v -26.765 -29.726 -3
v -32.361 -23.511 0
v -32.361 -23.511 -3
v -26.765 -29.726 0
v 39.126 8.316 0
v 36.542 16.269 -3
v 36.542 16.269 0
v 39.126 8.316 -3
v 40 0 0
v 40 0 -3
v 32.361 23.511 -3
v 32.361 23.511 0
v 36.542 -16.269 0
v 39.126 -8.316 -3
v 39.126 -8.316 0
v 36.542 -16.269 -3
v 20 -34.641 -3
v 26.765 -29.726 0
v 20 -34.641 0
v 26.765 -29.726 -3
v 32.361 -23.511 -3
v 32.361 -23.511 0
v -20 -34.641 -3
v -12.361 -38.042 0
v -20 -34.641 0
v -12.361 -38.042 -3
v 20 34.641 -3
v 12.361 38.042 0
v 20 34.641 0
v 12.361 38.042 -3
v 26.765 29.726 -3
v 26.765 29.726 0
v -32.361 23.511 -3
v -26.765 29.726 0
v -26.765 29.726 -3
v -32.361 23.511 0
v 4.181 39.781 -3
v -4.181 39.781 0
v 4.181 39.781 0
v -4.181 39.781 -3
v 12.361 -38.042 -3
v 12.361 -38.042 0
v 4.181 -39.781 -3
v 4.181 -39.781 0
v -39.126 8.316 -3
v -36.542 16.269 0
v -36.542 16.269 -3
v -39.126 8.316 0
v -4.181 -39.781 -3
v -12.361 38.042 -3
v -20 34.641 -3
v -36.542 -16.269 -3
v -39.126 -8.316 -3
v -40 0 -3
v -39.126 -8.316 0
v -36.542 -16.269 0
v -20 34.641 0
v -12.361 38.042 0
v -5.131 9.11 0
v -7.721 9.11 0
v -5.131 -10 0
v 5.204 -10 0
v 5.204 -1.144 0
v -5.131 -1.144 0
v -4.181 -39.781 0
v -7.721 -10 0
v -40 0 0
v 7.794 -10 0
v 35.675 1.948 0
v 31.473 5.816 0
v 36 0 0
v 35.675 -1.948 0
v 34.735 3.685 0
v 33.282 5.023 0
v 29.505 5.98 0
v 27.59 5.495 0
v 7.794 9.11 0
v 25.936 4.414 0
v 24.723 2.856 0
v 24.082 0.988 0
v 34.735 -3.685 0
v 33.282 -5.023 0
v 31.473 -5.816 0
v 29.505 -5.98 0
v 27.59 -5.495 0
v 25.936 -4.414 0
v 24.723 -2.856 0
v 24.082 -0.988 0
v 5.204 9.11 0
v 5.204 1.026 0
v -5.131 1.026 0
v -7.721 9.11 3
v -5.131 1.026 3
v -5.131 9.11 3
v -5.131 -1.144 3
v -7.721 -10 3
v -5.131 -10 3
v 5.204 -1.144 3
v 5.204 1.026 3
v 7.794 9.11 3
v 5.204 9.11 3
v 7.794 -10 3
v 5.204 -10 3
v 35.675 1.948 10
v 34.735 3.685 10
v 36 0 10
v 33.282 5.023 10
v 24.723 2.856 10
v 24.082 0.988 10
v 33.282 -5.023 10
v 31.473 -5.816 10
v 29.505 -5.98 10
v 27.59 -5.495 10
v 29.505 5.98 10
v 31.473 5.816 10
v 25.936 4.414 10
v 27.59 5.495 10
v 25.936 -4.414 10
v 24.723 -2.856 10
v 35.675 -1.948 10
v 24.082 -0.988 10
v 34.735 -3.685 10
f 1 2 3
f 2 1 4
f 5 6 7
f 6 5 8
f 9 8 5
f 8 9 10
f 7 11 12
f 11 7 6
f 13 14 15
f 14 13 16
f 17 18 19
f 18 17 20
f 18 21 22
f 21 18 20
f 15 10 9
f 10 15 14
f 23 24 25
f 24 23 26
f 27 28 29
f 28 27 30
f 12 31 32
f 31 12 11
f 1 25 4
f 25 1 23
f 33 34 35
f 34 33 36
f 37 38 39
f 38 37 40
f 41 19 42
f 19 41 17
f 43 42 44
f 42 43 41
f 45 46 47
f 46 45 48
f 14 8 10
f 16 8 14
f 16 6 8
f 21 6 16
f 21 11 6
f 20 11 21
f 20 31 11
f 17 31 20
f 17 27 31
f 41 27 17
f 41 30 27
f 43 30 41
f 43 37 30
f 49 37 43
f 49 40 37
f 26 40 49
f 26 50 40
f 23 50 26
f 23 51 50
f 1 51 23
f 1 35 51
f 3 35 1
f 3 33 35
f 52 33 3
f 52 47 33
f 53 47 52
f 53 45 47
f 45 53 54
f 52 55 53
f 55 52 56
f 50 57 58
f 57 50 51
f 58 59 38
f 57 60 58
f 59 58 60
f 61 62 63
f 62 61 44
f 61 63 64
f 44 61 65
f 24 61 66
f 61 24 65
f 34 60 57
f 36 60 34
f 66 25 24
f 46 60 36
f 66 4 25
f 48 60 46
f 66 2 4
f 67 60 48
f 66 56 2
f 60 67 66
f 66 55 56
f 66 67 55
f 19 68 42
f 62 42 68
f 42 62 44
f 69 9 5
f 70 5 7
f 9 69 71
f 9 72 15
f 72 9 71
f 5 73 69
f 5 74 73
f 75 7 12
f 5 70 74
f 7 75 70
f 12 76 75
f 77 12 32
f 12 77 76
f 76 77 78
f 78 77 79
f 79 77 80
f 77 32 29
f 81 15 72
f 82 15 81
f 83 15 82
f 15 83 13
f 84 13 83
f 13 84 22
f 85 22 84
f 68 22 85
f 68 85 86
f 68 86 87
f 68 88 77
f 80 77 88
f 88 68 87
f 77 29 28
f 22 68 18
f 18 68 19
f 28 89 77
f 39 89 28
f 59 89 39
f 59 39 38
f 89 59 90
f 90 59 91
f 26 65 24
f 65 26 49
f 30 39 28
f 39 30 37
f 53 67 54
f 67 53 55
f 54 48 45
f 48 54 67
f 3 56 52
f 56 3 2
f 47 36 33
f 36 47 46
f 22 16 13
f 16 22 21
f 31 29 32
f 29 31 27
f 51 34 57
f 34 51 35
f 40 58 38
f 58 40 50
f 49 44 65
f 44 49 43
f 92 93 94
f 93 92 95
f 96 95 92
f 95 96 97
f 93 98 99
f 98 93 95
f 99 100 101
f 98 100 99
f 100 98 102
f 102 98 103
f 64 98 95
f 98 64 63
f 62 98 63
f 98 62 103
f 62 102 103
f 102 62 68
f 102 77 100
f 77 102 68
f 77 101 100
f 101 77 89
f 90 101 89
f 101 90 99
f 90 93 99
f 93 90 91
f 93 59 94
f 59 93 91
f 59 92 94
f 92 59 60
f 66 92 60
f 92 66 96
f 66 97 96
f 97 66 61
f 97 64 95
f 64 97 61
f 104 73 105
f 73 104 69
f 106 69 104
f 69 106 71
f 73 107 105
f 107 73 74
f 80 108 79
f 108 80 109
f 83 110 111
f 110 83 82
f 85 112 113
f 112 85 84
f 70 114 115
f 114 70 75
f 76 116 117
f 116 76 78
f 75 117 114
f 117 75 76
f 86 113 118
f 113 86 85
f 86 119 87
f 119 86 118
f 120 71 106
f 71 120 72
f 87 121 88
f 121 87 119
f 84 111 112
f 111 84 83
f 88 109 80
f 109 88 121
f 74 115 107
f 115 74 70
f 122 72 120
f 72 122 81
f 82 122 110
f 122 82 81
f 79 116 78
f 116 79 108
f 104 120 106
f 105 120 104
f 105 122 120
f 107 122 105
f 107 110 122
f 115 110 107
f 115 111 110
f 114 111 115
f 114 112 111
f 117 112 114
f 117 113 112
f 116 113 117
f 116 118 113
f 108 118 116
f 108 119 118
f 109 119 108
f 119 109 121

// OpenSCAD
// This is the name of the element. Use the element symbol here.
element = "H";

//This is the number of covalent bonds the atom makes.
bonds = 1; // min/max:[1:4]

module main(){
union(){
    translate([0,0,-3]) cylinder(3,40,40);
    translate([-10,-10,0]) scale([2,2,5]) linear_extrude(0.6) text(element);

    if(bonds>=1){
        translate ([30,0,0]) cylinder(10,6,6);
    }
    if(bonds>=2){
        translate ([-30,0,0]) cylinder(10,6,6);
    }
    if(bonds>=3){
        translate ([0,30,0]) cylinder(10,6,6);
    }
    if(bonds>=4){
        translate ([0,-30,0]) cylinder(10,6,6);
    }
}
}

main();
